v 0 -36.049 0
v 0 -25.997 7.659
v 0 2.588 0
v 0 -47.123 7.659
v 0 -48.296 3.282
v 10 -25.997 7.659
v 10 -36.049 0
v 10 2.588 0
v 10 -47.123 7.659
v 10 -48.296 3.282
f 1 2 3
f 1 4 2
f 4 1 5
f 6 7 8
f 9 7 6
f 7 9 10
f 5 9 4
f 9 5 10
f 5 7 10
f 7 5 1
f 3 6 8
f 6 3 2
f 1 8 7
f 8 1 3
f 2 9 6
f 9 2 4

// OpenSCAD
a = 75;
difference(){
    translate([0, 0, -sin(a) * 10])
    rotate([a, 0, 0])
    cube(size=[10, 10, 50]);
    translate([-1, -49 + cos(a)*10, -sin(a)*10 - 1])
    cube(size=[12, 50, sin(a)*10+1]);
    translate([-1, -55 + cos(a)*10, sin(a)*10 -2])
    cube(size=[12, 50, sin(a)*10+1]);
}
